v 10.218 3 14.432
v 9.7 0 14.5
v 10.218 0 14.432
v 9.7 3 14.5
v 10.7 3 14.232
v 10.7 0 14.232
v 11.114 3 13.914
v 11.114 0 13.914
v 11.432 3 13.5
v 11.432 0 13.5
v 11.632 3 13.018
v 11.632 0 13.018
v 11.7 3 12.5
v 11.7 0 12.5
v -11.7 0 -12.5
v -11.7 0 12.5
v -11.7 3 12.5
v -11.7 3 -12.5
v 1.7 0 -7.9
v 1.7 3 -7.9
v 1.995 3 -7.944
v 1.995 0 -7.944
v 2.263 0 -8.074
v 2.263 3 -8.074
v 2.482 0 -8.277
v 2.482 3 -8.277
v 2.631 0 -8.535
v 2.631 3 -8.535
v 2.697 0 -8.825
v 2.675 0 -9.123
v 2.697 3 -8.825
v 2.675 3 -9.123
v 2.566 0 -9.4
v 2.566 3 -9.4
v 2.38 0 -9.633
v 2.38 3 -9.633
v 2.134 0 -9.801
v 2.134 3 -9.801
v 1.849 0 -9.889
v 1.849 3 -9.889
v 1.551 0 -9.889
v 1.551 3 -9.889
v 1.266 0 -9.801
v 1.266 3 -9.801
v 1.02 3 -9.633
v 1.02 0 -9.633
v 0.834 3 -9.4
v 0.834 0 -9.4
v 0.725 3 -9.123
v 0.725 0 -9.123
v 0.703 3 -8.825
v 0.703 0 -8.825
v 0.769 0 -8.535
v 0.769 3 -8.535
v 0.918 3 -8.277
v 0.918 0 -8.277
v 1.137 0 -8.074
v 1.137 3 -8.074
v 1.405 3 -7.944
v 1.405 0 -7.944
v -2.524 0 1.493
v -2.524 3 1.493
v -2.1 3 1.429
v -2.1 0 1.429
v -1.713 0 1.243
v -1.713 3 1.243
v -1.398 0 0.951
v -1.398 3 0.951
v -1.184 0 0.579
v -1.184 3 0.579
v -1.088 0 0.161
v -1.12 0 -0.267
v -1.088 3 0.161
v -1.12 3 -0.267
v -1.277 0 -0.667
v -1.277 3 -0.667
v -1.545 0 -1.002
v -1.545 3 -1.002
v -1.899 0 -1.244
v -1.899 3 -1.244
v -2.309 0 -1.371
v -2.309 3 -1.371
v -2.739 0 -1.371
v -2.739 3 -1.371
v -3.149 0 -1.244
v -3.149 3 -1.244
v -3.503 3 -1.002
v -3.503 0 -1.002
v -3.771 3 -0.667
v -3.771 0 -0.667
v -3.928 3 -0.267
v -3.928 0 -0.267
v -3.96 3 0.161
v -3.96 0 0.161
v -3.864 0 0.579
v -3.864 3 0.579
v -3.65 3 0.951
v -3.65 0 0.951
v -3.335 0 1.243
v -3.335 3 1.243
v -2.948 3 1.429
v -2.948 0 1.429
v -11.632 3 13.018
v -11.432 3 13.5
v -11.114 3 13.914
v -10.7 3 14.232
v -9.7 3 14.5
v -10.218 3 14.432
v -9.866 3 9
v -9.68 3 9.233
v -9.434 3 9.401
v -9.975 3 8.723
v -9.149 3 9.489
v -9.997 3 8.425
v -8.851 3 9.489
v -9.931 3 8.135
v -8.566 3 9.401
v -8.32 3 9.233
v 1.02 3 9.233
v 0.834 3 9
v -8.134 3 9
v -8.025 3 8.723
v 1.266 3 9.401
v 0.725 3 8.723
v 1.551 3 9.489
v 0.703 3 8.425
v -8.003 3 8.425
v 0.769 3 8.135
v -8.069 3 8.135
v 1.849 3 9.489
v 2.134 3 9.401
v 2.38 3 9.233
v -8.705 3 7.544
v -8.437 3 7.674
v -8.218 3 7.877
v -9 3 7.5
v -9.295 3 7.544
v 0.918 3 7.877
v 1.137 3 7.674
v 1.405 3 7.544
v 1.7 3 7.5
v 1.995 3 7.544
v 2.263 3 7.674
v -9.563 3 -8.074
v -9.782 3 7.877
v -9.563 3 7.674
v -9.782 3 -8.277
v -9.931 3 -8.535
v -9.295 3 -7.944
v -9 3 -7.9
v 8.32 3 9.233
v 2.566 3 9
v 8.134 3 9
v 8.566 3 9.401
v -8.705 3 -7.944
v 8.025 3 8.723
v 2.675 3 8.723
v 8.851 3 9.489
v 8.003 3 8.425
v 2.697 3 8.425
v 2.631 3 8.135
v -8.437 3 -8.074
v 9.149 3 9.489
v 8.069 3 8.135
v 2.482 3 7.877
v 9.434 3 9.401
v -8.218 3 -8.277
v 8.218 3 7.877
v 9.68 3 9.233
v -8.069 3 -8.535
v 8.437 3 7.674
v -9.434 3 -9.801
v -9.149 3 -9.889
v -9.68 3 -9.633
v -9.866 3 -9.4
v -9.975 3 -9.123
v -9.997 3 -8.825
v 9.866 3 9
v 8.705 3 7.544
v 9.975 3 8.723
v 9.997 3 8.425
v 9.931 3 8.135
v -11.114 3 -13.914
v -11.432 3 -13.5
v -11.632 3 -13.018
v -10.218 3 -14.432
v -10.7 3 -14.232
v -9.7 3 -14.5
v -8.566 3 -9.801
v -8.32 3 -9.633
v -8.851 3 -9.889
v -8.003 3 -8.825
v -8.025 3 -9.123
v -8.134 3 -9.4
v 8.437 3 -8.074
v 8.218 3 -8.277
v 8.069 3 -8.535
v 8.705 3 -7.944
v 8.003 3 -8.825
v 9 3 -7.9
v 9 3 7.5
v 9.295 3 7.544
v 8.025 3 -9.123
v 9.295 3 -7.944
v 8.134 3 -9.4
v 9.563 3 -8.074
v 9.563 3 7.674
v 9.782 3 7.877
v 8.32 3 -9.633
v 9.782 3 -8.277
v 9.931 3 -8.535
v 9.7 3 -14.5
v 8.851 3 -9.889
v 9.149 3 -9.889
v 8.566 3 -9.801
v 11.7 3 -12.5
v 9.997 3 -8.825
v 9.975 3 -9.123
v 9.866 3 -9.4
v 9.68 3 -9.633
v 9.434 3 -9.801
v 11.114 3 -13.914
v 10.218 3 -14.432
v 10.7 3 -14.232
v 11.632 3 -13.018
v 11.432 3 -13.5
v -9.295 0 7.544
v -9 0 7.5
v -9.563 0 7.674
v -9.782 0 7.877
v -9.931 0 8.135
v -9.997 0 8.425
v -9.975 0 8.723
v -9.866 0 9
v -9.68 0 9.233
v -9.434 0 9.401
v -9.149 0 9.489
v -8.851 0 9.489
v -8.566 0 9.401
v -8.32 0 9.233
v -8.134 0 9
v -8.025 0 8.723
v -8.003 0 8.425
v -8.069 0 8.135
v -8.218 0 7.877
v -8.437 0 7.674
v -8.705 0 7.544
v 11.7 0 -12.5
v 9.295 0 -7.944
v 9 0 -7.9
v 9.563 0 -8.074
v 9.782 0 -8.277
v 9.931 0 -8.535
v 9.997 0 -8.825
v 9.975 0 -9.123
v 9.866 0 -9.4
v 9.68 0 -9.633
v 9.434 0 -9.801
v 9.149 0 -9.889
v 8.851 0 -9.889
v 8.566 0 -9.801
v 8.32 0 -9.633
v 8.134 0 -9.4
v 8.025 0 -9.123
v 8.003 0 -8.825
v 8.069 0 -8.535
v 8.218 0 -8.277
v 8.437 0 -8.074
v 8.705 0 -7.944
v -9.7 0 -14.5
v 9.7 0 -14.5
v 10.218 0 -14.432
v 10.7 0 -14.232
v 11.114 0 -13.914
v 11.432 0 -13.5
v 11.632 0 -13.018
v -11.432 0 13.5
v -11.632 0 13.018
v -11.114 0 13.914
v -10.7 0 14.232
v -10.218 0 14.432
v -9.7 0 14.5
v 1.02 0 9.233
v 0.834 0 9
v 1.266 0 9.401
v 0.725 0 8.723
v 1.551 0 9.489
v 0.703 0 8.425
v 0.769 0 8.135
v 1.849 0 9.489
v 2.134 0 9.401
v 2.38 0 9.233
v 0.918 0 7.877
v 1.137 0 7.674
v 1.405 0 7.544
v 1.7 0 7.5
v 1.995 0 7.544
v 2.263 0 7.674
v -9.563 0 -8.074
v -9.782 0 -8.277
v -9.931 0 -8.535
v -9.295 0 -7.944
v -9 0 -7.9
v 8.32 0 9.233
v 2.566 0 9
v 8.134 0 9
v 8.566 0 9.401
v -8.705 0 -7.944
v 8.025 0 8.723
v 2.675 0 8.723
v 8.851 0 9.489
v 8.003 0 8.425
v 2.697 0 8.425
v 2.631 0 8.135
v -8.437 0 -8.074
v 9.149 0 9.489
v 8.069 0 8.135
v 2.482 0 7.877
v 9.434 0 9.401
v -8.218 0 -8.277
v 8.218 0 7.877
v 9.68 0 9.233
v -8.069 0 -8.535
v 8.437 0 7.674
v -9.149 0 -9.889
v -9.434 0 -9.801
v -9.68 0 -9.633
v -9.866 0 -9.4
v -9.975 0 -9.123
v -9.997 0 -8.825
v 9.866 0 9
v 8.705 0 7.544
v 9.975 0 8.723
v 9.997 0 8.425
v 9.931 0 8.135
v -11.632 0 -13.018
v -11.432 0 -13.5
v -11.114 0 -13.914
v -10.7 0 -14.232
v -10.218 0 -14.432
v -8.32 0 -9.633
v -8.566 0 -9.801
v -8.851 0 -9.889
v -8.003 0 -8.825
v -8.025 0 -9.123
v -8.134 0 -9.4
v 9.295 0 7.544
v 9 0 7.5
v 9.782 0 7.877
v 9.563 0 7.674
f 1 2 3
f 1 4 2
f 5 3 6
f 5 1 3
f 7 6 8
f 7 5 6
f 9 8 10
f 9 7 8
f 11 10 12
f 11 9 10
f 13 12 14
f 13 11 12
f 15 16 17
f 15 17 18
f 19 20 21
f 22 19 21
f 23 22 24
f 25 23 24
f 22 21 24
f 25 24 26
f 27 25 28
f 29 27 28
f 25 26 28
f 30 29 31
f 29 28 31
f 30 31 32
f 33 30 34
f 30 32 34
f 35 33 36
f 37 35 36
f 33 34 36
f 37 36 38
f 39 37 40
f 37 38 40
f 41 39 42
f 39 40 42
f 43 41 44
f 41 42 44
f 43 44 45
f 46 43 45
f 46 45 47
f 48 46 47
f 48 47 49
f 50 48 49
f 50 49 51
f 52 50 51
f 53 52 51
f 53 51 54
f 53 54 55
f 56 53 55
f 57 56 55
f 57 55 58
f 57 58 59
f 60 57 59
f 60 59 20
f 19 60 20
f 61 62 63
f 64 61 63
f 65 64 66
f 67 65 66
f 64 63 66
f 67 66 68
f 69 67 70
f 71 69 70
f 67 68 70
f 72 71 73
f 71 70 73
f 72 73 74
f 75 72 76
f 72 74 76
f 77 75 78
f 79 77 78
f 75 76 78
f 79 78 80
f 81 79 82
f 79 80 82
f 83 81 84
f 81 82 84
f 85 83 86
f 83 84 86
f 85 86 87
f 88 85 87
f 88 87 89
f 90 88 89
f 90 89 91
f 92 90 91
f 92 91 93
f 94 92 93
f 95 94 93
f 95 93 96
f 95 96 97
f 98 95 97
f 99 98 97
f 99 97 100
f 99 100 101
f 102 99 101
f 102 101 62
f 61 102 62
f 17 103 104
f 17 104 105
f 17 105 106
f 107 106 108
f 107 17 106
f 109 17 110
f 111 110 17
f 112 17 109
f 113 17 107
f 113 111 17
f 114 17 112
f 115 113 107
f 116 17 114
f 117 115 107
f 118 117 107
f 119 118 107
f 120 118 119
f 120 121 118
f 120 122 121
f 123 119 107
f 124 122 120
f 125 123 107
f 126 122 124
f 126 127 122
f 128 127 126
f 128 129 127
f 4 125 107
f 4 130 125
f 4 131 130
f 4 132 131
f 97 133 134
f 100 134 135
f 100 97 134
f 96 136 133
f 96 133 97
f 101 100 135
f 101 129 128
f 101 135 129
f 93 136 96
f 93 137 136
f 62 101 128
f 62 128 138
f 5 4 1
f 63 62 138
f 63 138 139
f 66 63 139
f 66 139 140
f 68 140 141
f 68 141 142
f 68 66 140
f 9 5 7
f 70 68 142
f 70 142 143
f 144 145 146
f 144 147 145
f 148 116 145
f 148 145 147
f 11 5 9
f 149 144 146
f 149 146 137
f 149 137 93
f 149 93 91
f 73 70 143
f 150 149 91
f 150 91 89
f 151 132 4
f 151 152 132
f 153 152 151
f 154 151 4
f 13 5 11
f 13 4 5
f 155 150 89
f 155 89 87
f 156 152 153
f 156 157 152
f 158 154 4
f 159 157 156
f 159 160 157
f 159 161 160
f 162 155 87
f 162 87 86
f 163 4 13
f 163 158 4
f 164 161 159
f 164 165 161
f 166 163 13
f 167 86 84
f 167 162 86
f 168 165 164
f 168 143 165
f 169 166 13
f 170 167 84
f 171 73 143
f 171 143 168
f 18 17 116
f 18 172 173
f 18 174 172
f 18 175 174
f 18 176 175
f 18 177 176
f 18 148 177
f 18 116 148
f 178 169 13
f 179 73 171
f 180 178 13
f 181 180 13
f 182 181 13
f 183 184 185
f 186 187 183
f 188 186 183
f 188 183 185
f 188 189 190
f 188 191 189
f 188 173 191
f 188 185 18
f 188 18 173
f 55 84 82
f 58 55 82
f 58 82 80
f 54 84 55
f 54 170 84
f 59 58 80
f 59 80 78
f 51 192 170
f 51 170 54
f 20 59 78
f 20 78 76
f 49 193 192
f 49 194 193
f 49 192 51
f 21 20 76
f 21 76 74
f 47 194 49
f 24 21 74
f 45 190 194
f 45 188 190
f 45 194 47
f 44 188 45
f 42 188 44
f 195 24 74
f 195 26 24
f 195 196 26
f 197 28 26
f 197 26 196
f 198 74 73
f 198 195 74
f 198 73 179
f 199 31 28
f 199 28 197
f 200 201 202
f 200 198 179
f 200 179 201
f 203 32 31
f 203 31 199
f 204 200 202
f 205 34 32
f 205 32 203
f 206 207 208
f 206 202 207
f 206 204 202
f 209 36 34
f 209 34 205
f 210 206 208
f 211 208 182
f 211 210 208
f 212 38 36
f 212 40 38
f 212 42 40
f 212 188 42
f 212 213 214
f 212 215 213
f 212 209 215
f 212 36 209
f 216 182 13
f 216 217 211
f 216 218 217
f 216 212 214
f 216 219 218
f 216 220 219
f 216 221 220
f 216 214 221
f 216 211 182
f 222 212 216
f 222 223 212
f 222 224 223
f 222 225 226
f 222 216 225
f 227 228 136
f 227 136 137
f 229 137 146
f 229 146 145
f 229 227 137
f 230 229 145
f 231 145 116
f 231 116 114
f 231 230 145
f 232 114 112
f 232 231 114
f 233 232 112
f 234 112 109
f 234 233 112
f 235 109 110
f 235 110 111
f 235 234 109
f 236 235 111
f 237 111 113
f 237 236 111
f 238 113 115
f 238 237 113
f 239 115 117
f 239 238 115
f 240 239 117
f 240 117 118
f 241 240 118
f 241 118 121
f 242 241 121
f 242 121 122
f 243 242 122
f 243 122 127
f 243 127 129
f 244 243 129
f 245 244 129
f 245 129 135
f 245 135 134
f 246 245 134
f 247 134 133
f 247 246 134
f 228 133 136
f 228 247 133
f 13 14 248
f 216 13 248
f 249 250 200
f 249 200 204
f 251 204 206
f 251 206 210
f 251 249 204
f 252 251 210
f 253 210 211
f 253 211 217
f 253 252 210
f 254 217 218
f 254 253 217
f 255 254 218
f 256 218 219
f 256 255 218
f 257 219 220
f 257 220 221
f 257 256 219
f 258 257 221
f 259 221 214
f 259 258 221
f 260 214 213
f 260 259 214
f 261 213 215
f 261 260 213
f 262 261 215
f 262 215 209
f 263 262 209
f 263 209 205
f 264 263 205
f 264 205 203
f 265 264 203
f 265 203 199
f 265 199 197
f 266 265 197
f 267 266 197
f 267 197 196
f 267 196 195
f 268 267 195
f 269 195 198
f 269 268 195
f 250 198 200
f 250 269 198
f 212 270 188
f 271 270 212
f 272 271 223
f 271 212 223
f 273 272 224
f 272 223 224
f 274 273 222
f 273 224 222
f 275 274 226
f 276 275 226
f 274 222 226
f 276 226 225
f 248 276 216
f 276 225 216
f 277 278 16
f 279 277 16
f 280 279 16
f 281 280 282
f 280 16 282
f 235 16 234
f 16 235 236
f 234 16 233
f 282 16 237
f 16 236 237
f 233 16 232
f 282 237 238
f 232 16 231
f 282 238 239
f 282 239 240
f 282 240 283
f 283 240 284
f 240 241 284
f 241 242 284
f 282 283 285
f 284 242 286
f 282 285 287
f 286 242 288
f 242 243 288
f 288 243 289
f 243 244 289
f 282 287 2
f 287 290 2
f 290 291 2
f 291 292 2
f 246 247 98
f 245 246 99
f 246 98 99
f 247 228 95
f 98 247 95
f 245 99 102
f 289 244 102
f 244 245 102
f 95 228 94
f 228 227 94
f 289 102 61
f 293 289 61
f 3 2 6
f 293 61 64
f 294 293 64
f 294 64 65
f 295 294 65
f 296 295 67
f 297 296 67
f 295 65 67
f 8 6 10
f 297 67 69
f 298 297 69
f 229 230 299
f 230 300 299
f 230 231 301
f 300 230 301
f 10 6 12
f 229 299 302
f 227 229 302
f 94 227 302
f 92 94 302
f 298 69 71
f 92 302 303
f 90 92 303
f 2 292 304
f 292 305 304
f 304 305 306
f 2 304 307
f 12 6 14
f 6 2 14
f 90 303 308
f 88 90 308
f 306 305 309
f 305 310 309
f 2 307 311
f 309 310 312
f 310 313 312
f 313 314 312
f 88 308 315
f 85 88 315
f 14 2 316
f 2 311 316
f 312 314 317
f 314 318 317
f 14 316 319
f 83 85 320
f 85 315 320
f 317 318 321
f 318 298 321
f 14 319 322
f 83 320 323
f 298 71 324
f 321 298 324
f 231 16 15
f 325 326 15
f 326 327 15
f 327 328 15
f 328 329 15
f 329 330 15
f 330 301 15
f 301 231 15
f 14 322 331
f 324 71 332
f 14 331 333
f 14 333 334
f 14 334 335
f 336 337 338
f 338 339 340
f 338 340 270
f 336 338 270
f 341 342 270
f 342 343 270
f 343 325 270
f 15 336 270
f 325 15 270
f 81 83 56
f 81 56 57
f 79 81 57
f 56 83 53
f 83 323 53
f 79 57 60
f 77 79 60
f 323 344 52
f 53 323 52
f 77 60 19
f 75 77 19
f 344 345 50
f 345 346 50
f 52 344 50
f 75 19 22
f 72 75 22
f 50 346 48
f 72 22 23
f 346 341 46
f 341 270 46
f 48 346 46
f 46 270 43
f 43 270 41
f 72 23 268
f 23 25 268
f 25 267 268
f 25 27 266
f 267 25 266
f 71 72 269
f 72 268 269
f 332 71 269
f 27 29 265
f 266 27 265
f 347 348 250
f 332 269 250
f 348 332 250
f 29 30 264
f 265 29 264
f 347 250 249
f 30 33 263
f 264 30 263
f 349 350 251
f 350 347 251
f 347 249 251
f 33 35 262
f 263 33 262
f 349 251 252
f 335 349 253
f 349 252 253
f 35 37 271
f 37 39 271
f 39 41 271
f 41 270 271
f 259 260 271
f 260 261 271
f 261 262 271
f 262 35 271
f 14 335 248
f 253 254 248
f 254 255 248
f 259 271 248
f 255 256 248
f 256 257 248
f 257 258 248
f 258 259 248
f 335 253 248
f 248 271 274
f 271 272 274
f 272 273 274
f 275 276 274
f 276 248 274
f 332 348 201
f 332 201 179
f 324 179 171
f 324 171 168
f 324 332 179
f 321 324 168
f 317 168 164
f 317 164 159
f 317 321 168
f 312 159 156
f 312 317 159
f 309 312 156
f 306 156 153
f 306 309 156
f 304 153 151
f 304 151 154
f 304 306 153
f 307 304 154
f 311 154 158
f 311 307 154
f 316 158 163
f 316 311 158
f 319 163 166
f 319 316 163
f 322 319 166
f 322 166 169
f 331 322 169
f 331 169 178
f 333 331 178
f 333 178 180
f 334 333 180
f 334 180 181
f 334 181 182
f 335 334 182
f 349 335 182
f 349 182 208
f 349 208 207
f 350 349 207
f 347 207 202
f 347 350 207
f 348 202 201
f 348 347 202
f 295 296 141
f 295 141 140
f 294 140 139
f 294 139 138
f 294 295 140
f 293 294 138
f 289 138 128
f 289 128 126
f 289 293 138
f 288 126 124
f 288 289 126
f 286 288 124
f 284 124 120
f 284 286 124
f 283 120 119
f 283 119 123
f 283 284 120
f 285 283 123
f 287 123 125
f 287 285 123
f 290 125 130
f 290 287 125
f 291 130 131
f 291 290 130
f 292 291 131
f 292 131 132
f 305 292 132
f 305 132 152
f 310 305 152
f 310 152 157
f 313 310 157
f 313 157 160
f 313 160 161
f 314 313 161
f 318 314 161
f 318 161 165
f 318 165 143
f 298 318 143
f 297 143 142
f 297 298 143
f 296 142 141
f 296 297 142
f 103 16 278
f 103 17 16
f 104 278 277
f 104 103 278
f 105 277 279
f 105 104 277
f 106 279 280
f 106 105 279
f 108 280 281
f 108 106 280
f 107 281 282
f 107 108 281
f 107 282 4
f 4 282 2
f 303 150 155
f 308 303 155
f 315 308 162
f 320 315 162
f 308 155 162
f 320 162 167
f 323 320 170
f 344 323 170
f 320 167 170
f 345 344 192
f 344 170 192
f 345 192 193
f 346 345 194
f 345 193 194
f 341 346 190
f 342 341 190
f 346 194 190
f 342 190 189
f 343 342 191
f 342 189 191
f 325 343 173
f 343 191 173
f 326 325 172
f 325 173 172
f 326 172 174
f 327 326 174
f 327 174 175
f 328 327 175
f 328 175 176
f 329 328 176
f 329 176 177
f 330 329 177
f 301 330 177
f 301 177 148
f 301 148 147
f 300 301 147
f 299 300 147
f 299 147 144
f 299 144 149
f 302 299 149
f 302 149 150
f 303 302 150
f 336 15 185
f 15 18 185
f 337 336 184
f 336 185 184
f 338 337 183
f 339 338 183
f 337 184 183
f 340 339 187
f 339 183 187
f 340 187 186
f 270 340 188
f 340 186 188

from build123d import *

# Parameters (mm, degrees)
BOSS_EXTRUDE1_DEPTH   = 3
BOSS_EXTRUDE1_2_DEPTH = 3
SKETCH1_W             = 23.4
SKETCH1_H             = 29
SKETCH1_R             = 1
BOSS_EXTRUDE1_3_DEPTH = 3
FILLET1_R             = 2
SKETCH5_R             = 1.44
CUT_EXTRUDE3_DEPTH    = 10
CUT_EXTRUDE4_DEPTH    = 10
SKETCH8_R             = 1
CUT_EXTRUDE5_DEPTH    = 10
SKETCH9_R             = 3.026992654
BOSS_EXTRUDE3_DEPTH   = 3
SKETCH10_R            = 1.44
CUT_EXTRUDE6_DEPTH    = 3.5


with BuildPart() as part:
    # Sketch1 → Boss-Extrude1 (new body)
    with BuildSketch(Plane(origin=(0, 0, 0), x_dir=(1, 0, 0), z_dir=(0, 1, 0))):
        with BuildLine():
            add(Edge.make_bspline(
                [(19.180993887, -14.242526212), (19.80083761, -12.341053413), (17.899318471, -11.721194585), (17.279474749, -13.622667384), (16.659631026, -15.524140184), (18.561150164, -16.143999012), (19.180993887, -14.242526212)],
                knots=[0, 0, 0, 0, 0.5, 0.5, 0.5, 1, 1, 1, 1], degree=3, weights=[1, 0.333333333, 0.333333333, 1, 0.333333333, 0.333333333, 1]))
        make_face()
    extrude(amount=BOSS_EXTRUDE1_DEPTH)


with BuildPart() as body_2:
    # Sketch1 → Boss-Extrude1 2 (new body)
    with BuildSketch(Plane(origin=(0, 0, 0), x_dir=(1, 0, 0), z_dir=(0, 1, 0))):
        with BuildLine():
            add(Edge.make_bspline(
                [(22.488505608, -4.096188772), (23.108349331, -2.194715972), (21.206830193, -1.574857144), (20.58698647, -3.476329943), (19.967142747, -5.377802743), (21.868661885, -5.997661571), (22.488505608, -4.096188772)],
                knots=[0, 0, 0, 0, 0.5, 0.5, 0.5, 1, 1, 1, 1], degree=3, weights=[1, 0.333333333, 0.333333333, 1, 0.333333333, 0.333333333, 1]))
        make_face()
    extrude(amount=BOSS_EXTRUDE1_2_DEPTH)


with BuildPart() as body_3:
    # Sketch1 → Boss-Extrude1 3 (new body)
    with BuildSketch(Plane(origin=(0, 0, 0), x_dir=(1, 0, 0), z_dir=(0, 1, 0))):
        Rectangle(SKETCH1_W, SKETCH1_H)
        with Locations(Location((9, 8.9, 0), (0, 0, 270))):
            Circle(SKETCH1_R, mode=Mode.SUBTRACT)
        with Locations(Location((9, -8.5, 0), (0, 0, 90))):
            Circle(SKETCH1_R, mode=Mode.SUBTRACT)
        with Locations(Location((-9, -8.5, 0), (0, 0, 90))):
            Circle(SKETCH1_R, mode=Mode.SUBTRACT)
        with Locations(Location((1.7, -8.5, 0), (0, 0, 90))):
            Circle(SKETCH1_R, mode=Mode.SUBTRACT)
    extrude(amount=BOSS_EXTRUDE1_3_DEPTH)

    # Fillet1
    fillet1_edges = [body_3.edges().sort_by_distance(p)[0] for p in [
        (11.7, 1.5, 14.5),
        (-11.7, 1.5, 14.5),
        (-11.7, 1.5, -14.5),
        (11.7, 1.5, -14.5),
    ]]
    fillet(fillet1_edges, radius=FILLET1_R)

    # Sketch5 → Cut-Extrude3 (cut)
    with BuildSketch(Plane.XZ):
        with Locations(Location((-2.145634177, 3.61037734, 0), (0, 0, 270))):
            Circle(SKETCH5_R)
    extrude(amount=-CUT_EXTRUDE3_DEPTH, mode=Mode.SUBTRACT)

    # Sketch8 → Cut-Extrude5 (cut)
    with BuildSketch(Plane(origin=(0, 3, 0), x_dir=(1, 0, 0), z_dir=(0, 1, 0))):
        with Locations(Location((1.7, 8.9, 0), (0, 0, 270))):
            Circle(SKETCH8_R)
        with Locations(Location((-9, 8.9, 0), (0, 0, 270))):
            Circle(SKETCH8_R)
    extrude(amount=-CUT_EXTRUDE5_DEPTH, mode=Mode.SUBTRACT)

    # Sketch9 → Boss-Extrude3 (add)
    with BuildSketch(Plane(origin=(0, 3, 0), x_dir=(1, 0, 0), z_dir=(0, 1, 0))):
        with Locations((-2.145634177, -3.61037734)):
            Circle(SKETCH9_R)
    extrude(amount=-BOSS_EXTRUDE3_DEPTH)

    # Sketch10 → Cut-Extrude6 (cut)
    with BuildSketch(Plane(origin=(0, 3, 0), x_dir=(1, 0, 0), z_dir=(0, 1, 0))):
        with Locations(Location((-2.523984187, -0.0532018, 0), (0, 0, 270))):
            Circle(SKETCH10_R)
    extrude(amount=-CUT_EXTRUDE6_DEPTH, mode=Mode.SUBTRACT)


with BuildPart() as cut_extrude4_tool:
    # Sketch7 → Cut-Extrude4 (new body)
    with BuildSketch(Plane(origin=(0, 3, 0), x_dir=(1, 0, 0), z_dir=(0, 1, 0))):
        with BuildLine():
            add(Edge.make_bspline(
                [(19.180993887, -14.242526212), (19.80083761, -12.341053413), (17.899318471, -11.721194585), (17.279474749, -13.622667384), (16.659631026, -15.524140184), (18.561150164, -16.143999012), (19.180993887, -14.242526212)],
                knots=[0, 0, 0, 0, 0.5, 0.5, 0.5, 1, 1, 1, 1], degree=3, weights=[1, 0.333333333, 0.333333333, 1, 0.333333333, 0.333333333, 1]))
        make_face()
        with BuildLine():
            add(Edge.make_bspline(
                [(22.488505608, -4.096188772), (23.108349331, -2.194715972), (21.206830193, -1.574857144), (20.58698647, -3.476329943), (19.967142747, -5.377802743), (21.868661885, -5.997661571), (22.488505608, -4.096188772)],
                knots=[0, 0, 0, 0, 0.5, 0.5, 0.5, 1, 1, 1, 1], degree=3, weights=[1, 0.333333333, 0.333333333, 1, 0.333333333, 0.333333333, 1]))
        make_face()
    extrude(amount=-CUT_EXTRUDE4_DEPTH)


with BuildPart() as part_1:
    add(part.part)

    # Cut-Extrude4: cut by cut_extrude4_tool
    add(cut_extrude4_tool.part, mode=Mode.SUBTRACT)


with BuildPart() as body_2_1:
    add(body_2.part)

    # Cut-Extrude4: cut by cut_extrude4_tool
    add(cut_extrude4_tool.part, mode=Mode.SUBTRACT)


solid = body_3.part
